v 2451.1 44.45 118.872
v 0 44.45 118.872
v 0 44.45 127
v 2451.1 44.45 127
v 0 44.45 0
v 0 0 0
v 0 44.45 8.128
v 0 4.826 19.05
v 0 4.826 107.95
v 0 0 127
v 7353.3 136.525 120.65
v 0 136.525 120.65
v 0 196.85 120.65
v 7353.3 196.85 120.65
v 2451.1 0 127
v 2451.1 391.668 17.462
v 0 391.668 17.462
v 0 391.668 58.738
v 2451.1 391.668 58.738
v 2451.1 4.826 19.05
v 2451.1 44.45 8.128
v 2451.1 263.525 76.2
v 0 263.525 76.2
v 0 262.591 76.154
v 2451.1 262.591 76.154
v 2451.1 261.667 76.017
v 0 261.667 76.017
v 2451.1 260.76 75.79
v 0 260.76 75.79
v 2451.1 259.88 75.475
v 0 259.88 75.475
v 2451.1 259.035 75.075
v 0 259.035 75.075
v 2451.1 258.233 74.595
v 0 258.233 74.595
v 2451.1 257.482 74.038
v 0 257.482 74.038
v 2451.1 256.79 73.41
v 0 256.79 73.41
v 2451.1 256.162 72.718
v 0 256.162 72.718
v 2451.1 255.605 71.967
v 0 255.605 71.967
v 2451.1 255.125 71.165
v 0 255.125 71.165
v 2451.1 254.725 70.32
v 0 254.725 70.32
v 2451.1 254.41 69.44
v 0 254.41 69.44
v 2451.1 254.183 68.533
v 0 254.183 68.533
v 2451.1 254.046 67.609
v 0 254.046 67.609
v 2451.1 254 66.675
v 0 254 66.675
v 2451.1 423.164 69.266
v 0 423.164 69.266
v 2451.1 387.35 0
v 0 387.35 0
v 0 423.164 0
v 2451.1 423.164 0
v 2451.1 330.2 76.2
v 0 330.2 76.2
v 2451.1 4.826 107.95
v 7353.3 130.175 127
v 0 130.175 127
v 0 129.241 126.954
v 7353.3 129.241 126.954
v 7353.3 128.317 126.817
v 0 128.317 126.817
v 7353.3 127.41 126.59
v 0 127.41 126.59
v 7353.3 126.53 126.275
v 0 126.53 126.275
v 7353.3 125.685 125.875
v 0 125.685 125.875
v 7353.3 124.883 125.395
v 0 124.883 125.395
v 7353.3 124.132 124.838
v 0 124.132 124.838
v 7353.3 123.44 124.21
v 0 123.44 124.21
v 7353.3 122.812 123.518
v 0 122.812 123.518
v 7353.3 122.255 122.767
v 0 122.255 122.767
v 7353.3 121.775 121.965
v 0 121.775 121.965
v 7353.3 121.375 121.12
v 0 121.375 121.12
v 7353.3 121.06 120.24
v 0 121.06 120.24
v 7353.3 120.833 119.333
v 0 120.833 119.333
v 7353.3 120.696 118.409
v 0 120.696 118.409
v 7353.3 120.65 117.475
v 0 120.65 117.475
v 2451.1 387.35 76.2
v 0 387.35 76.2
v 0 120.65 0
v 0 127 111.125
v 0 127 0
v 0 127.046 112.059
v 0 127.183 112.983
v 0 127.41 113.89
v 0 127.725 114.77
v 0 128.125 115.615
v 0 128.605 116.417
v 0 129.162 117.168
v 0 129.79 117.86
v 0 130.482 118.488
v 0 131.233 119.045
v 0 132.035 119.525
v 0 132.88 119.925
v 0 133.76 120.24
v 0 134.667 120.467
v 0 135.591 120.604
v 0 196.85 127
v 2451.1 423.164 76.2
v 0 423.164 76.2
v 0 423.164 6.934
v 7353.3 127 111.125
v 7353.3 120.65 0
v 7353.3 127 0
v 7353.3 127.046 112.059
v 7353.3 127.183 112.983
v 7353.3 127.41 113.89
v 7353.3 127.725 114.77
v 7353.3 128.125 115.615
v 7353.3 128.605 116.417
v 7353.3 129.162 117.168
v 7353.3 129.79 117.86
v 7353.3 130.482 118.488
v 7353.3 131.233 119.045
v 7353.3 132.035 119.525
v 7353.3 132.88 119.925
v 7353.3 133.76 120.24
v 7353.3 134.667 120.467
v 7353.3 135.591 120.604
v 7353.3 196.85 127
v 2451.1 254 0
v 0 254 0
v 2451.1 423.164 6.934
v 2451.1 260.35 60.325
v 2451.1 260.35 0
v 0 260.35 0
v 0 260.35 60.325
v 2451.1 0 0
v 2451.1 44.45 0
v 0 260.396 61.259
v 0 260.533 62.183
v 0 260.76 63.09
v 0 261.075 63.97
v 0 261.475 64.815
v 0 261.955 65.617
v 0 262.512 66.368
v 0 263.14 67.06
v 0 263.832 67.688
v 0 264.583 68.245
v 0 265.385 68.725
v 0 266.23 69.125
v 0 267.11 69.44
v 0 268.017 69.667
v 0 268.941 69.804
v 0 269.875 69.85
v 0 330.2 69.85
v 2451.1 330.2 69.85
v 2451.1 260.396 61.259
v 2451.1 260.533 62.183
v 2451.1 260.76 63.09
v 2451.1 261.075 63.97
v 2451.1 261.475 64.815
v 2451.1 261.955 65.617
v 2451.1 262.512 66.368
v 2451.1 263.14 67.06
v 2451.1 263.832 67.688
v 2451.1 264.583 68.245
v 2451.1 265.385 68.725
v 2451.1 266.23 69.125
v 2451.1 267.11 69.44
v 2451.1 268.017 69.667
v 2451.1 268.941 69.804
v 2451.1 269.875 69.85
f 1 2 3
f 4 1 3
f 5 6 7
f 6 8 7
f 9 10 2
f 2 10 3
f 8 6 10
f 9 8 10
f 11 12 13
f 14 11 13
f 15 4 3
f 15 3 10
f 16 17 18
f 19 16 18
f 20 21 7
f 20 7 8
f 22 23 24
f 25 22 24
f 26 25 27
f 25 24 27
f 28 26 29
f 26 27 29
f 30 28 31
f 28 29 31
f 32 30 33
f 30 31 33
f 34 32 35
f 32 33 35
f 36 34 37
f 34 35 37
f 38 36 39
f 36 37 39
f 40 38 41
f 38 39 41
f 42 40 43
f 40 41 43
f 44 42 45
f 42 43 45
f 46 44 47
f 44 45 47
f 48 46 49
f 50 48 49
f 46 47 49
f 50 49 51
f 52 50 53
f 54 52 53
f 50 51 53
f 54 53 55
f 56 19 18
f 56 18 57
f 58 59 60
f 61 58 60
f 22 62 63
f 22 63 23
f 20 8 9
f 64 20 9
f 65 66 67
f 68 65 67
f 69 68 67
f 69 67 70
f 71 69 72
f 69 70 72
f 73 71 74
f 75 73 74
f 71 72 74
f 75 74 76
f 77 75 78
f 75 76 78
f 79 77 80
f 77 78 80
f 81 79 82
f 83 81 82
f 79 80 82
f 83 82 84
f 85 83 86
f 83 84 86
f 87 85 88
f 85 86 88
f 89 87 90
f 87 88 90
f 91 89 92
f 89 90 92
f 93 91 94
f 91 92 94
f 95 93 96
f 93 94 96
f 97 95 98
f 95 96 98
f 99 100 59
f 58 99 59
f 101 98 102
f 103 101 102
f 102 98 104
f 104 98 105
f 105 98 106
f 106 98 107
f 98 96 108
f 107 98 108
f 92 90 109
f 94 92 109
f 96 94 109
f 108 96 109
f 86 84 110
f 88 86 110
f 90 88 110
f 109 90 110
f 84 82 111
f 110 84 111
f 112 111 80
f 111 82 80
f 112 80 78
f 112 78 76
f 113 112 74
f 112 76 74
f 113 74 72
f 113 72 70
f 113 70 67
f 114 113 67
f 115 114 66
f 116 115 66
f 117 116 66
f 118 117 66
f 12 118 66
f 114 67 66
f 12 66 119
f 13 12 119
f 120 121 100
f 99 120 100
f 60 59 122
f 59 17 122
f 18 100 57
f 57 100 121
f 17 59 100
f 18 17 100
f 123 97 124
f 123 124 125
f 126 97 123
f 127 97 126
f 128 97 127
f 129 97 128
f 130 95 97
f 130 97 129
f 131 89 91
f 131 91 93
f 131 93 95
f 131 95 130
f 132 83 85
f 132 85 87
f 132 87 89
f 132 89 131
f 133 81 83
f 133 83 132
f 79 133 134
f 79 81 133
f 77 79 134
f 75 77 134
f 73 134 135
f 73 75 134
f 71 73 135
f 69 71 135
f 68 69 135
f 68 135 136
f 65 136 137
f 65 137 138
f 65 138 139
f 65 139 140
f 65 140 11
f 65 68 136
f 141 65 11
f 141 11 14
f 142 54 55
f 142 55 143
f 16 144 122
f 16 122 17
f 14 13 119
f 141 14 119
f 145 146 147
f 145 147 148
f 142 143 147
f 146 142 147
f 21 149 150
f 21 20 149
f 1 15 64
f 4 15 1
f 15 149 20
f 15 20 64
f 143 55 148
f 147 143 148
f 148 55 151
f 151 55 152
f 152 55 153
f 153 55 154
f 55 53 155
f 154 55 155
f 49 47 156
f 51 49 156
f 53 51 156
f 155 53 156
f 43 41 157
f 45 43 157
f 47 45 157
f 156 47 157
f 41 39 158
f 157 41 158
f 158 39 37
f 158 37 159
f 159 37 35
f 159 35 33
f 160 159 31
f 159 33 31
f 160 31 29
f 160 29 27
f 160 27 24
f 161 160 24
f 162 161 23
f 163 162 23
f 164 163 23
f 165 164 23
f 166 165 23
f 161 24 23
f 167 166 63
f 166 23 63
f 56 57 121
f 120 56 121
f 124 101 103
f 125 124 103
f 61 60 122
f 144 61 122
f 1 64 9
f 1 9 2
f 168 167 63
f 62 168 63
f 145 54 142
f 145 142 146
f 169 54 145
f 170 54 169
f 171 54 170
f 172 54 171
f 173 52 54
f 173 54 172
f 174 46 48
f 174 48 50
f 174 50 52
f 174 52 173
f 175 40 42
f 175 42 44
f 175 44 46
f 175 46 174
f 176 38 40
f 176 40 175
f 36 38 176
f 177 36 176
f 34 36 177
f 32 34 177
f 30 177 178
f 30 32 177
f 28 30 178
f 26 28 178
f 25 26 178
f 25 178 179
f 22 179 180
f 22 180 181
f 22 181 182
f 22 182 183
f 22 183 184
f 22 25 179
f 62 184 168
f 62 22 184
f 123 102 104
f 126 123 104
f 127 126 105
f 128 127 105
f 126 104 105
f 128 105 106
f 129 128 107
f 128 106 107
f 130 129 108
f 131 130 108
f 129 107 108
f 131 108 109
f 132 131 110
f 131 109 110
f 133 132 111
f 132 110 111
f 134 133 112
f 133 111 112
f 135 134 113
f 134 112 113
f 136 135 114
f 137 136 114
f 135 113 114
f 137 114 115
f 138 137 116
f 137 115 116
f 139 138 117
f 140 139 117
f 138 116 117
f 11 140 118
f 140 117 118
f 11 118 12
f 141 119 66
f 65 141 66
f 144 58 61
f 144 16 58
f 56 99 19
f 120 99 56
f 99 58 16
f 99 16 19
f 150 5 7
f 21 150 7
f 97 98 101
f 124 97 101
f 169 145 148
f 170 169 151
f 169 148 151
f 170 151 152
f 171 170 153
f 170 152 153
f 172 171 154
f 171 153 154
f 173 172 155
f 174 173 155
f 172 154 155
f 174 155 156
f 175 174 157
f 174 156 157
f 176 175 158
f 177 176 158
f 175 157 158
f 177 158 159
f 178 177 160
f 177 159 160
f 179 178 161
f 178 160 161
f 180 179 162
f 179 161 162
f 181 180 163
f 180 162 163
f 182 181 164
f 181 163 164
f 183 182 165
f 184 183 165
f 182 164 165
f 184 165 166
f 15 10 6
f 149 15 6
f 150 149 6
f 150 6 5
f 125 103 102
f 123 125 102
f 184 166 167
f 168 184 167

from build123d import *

# Parameters (mm, degrees)
F1_DEPTH = 2451.1
F2_DEPTH = 7353.3
F3_DEPTH = 2451.1
F4_DEPTH = 2451.1


with BuildPart() as f1:
    # F0 (on Right) → F1 (new body)
    with BuildSketch(Plane.YZ):
        Polygon((0, 127), (0, 0), (44.45, 0), (44.45, 8.128), (4.826, 19.05), (4.826, 107.95), (44.45, 118.872), (44.45, 127), align=None)
    extrude(amount=F1_DEPTH)


with BuildPart() as f2:
    # F0 (on Right) → F2 (new body)
    with BuildSketch(Plane.YZ):
        with BuildLine():
            Line((120.65, 117.475), (120.65, 0))
            Line((120.65, 0), (127, 0))
            Line((127, 0), (127, 111.125))
            ThreePointArc((127, 111.125), (129.789808, 117.860192), (136.525, 120.65))
            Line((136.525, 120.65), (196.85, 120.65))
            Line((196.85, 120.65), (196.85, 127))
            Line((196.85, 127), (130.175, 127))
            ThreePointArc((130.175, 127), (123.439808, 124.210192), (120.65, 117.475))
        make_face()
    extrude(amount=F2_DEPTH)


with BuildPart() as f3:
    # F0 (on Right) → F3 (new body)
    with BuildSketch(Plane.YZ):
        with BuildLine():
            Line((254, 66.675), (254, 0))
            Line((254, 0), (260.35, 0))
            Line((260.35, 0), (260.35, 60.325))
            ThreePointArc((260.35, 60.325), (263.139808, 67.060192), (269.875, 69.85))
            Line((269.875, 69.85), (330.2, 69.85))
            Line((330.2, 69.85), (330.2, 76.2))
            Line((330.2, 76.2), (263.525, 76.2))
            ThreePointArc((263.525, 76.2), (256.789808, 73.410192), (254, 66.675))
        make_face()
    extrude(amount=F3_DEPTH)


with BuildPart() as f4:
    # F0 (on Right) → F4 (new body)
    with BuildSketch(Plane.YZ):
        Polygon((387.35, 76.2), (387.35, 0), (423.164, 0), (423.164, 6.9342), (391.668, 17.4625), (391.668, 58.7375), (423.164, 69.2658), (423.164, 76.2), align=None)
    extrude(amount=F4_DEPTH)


solid = Compound([f1.part, f2.part, f3.part, f4.part])
